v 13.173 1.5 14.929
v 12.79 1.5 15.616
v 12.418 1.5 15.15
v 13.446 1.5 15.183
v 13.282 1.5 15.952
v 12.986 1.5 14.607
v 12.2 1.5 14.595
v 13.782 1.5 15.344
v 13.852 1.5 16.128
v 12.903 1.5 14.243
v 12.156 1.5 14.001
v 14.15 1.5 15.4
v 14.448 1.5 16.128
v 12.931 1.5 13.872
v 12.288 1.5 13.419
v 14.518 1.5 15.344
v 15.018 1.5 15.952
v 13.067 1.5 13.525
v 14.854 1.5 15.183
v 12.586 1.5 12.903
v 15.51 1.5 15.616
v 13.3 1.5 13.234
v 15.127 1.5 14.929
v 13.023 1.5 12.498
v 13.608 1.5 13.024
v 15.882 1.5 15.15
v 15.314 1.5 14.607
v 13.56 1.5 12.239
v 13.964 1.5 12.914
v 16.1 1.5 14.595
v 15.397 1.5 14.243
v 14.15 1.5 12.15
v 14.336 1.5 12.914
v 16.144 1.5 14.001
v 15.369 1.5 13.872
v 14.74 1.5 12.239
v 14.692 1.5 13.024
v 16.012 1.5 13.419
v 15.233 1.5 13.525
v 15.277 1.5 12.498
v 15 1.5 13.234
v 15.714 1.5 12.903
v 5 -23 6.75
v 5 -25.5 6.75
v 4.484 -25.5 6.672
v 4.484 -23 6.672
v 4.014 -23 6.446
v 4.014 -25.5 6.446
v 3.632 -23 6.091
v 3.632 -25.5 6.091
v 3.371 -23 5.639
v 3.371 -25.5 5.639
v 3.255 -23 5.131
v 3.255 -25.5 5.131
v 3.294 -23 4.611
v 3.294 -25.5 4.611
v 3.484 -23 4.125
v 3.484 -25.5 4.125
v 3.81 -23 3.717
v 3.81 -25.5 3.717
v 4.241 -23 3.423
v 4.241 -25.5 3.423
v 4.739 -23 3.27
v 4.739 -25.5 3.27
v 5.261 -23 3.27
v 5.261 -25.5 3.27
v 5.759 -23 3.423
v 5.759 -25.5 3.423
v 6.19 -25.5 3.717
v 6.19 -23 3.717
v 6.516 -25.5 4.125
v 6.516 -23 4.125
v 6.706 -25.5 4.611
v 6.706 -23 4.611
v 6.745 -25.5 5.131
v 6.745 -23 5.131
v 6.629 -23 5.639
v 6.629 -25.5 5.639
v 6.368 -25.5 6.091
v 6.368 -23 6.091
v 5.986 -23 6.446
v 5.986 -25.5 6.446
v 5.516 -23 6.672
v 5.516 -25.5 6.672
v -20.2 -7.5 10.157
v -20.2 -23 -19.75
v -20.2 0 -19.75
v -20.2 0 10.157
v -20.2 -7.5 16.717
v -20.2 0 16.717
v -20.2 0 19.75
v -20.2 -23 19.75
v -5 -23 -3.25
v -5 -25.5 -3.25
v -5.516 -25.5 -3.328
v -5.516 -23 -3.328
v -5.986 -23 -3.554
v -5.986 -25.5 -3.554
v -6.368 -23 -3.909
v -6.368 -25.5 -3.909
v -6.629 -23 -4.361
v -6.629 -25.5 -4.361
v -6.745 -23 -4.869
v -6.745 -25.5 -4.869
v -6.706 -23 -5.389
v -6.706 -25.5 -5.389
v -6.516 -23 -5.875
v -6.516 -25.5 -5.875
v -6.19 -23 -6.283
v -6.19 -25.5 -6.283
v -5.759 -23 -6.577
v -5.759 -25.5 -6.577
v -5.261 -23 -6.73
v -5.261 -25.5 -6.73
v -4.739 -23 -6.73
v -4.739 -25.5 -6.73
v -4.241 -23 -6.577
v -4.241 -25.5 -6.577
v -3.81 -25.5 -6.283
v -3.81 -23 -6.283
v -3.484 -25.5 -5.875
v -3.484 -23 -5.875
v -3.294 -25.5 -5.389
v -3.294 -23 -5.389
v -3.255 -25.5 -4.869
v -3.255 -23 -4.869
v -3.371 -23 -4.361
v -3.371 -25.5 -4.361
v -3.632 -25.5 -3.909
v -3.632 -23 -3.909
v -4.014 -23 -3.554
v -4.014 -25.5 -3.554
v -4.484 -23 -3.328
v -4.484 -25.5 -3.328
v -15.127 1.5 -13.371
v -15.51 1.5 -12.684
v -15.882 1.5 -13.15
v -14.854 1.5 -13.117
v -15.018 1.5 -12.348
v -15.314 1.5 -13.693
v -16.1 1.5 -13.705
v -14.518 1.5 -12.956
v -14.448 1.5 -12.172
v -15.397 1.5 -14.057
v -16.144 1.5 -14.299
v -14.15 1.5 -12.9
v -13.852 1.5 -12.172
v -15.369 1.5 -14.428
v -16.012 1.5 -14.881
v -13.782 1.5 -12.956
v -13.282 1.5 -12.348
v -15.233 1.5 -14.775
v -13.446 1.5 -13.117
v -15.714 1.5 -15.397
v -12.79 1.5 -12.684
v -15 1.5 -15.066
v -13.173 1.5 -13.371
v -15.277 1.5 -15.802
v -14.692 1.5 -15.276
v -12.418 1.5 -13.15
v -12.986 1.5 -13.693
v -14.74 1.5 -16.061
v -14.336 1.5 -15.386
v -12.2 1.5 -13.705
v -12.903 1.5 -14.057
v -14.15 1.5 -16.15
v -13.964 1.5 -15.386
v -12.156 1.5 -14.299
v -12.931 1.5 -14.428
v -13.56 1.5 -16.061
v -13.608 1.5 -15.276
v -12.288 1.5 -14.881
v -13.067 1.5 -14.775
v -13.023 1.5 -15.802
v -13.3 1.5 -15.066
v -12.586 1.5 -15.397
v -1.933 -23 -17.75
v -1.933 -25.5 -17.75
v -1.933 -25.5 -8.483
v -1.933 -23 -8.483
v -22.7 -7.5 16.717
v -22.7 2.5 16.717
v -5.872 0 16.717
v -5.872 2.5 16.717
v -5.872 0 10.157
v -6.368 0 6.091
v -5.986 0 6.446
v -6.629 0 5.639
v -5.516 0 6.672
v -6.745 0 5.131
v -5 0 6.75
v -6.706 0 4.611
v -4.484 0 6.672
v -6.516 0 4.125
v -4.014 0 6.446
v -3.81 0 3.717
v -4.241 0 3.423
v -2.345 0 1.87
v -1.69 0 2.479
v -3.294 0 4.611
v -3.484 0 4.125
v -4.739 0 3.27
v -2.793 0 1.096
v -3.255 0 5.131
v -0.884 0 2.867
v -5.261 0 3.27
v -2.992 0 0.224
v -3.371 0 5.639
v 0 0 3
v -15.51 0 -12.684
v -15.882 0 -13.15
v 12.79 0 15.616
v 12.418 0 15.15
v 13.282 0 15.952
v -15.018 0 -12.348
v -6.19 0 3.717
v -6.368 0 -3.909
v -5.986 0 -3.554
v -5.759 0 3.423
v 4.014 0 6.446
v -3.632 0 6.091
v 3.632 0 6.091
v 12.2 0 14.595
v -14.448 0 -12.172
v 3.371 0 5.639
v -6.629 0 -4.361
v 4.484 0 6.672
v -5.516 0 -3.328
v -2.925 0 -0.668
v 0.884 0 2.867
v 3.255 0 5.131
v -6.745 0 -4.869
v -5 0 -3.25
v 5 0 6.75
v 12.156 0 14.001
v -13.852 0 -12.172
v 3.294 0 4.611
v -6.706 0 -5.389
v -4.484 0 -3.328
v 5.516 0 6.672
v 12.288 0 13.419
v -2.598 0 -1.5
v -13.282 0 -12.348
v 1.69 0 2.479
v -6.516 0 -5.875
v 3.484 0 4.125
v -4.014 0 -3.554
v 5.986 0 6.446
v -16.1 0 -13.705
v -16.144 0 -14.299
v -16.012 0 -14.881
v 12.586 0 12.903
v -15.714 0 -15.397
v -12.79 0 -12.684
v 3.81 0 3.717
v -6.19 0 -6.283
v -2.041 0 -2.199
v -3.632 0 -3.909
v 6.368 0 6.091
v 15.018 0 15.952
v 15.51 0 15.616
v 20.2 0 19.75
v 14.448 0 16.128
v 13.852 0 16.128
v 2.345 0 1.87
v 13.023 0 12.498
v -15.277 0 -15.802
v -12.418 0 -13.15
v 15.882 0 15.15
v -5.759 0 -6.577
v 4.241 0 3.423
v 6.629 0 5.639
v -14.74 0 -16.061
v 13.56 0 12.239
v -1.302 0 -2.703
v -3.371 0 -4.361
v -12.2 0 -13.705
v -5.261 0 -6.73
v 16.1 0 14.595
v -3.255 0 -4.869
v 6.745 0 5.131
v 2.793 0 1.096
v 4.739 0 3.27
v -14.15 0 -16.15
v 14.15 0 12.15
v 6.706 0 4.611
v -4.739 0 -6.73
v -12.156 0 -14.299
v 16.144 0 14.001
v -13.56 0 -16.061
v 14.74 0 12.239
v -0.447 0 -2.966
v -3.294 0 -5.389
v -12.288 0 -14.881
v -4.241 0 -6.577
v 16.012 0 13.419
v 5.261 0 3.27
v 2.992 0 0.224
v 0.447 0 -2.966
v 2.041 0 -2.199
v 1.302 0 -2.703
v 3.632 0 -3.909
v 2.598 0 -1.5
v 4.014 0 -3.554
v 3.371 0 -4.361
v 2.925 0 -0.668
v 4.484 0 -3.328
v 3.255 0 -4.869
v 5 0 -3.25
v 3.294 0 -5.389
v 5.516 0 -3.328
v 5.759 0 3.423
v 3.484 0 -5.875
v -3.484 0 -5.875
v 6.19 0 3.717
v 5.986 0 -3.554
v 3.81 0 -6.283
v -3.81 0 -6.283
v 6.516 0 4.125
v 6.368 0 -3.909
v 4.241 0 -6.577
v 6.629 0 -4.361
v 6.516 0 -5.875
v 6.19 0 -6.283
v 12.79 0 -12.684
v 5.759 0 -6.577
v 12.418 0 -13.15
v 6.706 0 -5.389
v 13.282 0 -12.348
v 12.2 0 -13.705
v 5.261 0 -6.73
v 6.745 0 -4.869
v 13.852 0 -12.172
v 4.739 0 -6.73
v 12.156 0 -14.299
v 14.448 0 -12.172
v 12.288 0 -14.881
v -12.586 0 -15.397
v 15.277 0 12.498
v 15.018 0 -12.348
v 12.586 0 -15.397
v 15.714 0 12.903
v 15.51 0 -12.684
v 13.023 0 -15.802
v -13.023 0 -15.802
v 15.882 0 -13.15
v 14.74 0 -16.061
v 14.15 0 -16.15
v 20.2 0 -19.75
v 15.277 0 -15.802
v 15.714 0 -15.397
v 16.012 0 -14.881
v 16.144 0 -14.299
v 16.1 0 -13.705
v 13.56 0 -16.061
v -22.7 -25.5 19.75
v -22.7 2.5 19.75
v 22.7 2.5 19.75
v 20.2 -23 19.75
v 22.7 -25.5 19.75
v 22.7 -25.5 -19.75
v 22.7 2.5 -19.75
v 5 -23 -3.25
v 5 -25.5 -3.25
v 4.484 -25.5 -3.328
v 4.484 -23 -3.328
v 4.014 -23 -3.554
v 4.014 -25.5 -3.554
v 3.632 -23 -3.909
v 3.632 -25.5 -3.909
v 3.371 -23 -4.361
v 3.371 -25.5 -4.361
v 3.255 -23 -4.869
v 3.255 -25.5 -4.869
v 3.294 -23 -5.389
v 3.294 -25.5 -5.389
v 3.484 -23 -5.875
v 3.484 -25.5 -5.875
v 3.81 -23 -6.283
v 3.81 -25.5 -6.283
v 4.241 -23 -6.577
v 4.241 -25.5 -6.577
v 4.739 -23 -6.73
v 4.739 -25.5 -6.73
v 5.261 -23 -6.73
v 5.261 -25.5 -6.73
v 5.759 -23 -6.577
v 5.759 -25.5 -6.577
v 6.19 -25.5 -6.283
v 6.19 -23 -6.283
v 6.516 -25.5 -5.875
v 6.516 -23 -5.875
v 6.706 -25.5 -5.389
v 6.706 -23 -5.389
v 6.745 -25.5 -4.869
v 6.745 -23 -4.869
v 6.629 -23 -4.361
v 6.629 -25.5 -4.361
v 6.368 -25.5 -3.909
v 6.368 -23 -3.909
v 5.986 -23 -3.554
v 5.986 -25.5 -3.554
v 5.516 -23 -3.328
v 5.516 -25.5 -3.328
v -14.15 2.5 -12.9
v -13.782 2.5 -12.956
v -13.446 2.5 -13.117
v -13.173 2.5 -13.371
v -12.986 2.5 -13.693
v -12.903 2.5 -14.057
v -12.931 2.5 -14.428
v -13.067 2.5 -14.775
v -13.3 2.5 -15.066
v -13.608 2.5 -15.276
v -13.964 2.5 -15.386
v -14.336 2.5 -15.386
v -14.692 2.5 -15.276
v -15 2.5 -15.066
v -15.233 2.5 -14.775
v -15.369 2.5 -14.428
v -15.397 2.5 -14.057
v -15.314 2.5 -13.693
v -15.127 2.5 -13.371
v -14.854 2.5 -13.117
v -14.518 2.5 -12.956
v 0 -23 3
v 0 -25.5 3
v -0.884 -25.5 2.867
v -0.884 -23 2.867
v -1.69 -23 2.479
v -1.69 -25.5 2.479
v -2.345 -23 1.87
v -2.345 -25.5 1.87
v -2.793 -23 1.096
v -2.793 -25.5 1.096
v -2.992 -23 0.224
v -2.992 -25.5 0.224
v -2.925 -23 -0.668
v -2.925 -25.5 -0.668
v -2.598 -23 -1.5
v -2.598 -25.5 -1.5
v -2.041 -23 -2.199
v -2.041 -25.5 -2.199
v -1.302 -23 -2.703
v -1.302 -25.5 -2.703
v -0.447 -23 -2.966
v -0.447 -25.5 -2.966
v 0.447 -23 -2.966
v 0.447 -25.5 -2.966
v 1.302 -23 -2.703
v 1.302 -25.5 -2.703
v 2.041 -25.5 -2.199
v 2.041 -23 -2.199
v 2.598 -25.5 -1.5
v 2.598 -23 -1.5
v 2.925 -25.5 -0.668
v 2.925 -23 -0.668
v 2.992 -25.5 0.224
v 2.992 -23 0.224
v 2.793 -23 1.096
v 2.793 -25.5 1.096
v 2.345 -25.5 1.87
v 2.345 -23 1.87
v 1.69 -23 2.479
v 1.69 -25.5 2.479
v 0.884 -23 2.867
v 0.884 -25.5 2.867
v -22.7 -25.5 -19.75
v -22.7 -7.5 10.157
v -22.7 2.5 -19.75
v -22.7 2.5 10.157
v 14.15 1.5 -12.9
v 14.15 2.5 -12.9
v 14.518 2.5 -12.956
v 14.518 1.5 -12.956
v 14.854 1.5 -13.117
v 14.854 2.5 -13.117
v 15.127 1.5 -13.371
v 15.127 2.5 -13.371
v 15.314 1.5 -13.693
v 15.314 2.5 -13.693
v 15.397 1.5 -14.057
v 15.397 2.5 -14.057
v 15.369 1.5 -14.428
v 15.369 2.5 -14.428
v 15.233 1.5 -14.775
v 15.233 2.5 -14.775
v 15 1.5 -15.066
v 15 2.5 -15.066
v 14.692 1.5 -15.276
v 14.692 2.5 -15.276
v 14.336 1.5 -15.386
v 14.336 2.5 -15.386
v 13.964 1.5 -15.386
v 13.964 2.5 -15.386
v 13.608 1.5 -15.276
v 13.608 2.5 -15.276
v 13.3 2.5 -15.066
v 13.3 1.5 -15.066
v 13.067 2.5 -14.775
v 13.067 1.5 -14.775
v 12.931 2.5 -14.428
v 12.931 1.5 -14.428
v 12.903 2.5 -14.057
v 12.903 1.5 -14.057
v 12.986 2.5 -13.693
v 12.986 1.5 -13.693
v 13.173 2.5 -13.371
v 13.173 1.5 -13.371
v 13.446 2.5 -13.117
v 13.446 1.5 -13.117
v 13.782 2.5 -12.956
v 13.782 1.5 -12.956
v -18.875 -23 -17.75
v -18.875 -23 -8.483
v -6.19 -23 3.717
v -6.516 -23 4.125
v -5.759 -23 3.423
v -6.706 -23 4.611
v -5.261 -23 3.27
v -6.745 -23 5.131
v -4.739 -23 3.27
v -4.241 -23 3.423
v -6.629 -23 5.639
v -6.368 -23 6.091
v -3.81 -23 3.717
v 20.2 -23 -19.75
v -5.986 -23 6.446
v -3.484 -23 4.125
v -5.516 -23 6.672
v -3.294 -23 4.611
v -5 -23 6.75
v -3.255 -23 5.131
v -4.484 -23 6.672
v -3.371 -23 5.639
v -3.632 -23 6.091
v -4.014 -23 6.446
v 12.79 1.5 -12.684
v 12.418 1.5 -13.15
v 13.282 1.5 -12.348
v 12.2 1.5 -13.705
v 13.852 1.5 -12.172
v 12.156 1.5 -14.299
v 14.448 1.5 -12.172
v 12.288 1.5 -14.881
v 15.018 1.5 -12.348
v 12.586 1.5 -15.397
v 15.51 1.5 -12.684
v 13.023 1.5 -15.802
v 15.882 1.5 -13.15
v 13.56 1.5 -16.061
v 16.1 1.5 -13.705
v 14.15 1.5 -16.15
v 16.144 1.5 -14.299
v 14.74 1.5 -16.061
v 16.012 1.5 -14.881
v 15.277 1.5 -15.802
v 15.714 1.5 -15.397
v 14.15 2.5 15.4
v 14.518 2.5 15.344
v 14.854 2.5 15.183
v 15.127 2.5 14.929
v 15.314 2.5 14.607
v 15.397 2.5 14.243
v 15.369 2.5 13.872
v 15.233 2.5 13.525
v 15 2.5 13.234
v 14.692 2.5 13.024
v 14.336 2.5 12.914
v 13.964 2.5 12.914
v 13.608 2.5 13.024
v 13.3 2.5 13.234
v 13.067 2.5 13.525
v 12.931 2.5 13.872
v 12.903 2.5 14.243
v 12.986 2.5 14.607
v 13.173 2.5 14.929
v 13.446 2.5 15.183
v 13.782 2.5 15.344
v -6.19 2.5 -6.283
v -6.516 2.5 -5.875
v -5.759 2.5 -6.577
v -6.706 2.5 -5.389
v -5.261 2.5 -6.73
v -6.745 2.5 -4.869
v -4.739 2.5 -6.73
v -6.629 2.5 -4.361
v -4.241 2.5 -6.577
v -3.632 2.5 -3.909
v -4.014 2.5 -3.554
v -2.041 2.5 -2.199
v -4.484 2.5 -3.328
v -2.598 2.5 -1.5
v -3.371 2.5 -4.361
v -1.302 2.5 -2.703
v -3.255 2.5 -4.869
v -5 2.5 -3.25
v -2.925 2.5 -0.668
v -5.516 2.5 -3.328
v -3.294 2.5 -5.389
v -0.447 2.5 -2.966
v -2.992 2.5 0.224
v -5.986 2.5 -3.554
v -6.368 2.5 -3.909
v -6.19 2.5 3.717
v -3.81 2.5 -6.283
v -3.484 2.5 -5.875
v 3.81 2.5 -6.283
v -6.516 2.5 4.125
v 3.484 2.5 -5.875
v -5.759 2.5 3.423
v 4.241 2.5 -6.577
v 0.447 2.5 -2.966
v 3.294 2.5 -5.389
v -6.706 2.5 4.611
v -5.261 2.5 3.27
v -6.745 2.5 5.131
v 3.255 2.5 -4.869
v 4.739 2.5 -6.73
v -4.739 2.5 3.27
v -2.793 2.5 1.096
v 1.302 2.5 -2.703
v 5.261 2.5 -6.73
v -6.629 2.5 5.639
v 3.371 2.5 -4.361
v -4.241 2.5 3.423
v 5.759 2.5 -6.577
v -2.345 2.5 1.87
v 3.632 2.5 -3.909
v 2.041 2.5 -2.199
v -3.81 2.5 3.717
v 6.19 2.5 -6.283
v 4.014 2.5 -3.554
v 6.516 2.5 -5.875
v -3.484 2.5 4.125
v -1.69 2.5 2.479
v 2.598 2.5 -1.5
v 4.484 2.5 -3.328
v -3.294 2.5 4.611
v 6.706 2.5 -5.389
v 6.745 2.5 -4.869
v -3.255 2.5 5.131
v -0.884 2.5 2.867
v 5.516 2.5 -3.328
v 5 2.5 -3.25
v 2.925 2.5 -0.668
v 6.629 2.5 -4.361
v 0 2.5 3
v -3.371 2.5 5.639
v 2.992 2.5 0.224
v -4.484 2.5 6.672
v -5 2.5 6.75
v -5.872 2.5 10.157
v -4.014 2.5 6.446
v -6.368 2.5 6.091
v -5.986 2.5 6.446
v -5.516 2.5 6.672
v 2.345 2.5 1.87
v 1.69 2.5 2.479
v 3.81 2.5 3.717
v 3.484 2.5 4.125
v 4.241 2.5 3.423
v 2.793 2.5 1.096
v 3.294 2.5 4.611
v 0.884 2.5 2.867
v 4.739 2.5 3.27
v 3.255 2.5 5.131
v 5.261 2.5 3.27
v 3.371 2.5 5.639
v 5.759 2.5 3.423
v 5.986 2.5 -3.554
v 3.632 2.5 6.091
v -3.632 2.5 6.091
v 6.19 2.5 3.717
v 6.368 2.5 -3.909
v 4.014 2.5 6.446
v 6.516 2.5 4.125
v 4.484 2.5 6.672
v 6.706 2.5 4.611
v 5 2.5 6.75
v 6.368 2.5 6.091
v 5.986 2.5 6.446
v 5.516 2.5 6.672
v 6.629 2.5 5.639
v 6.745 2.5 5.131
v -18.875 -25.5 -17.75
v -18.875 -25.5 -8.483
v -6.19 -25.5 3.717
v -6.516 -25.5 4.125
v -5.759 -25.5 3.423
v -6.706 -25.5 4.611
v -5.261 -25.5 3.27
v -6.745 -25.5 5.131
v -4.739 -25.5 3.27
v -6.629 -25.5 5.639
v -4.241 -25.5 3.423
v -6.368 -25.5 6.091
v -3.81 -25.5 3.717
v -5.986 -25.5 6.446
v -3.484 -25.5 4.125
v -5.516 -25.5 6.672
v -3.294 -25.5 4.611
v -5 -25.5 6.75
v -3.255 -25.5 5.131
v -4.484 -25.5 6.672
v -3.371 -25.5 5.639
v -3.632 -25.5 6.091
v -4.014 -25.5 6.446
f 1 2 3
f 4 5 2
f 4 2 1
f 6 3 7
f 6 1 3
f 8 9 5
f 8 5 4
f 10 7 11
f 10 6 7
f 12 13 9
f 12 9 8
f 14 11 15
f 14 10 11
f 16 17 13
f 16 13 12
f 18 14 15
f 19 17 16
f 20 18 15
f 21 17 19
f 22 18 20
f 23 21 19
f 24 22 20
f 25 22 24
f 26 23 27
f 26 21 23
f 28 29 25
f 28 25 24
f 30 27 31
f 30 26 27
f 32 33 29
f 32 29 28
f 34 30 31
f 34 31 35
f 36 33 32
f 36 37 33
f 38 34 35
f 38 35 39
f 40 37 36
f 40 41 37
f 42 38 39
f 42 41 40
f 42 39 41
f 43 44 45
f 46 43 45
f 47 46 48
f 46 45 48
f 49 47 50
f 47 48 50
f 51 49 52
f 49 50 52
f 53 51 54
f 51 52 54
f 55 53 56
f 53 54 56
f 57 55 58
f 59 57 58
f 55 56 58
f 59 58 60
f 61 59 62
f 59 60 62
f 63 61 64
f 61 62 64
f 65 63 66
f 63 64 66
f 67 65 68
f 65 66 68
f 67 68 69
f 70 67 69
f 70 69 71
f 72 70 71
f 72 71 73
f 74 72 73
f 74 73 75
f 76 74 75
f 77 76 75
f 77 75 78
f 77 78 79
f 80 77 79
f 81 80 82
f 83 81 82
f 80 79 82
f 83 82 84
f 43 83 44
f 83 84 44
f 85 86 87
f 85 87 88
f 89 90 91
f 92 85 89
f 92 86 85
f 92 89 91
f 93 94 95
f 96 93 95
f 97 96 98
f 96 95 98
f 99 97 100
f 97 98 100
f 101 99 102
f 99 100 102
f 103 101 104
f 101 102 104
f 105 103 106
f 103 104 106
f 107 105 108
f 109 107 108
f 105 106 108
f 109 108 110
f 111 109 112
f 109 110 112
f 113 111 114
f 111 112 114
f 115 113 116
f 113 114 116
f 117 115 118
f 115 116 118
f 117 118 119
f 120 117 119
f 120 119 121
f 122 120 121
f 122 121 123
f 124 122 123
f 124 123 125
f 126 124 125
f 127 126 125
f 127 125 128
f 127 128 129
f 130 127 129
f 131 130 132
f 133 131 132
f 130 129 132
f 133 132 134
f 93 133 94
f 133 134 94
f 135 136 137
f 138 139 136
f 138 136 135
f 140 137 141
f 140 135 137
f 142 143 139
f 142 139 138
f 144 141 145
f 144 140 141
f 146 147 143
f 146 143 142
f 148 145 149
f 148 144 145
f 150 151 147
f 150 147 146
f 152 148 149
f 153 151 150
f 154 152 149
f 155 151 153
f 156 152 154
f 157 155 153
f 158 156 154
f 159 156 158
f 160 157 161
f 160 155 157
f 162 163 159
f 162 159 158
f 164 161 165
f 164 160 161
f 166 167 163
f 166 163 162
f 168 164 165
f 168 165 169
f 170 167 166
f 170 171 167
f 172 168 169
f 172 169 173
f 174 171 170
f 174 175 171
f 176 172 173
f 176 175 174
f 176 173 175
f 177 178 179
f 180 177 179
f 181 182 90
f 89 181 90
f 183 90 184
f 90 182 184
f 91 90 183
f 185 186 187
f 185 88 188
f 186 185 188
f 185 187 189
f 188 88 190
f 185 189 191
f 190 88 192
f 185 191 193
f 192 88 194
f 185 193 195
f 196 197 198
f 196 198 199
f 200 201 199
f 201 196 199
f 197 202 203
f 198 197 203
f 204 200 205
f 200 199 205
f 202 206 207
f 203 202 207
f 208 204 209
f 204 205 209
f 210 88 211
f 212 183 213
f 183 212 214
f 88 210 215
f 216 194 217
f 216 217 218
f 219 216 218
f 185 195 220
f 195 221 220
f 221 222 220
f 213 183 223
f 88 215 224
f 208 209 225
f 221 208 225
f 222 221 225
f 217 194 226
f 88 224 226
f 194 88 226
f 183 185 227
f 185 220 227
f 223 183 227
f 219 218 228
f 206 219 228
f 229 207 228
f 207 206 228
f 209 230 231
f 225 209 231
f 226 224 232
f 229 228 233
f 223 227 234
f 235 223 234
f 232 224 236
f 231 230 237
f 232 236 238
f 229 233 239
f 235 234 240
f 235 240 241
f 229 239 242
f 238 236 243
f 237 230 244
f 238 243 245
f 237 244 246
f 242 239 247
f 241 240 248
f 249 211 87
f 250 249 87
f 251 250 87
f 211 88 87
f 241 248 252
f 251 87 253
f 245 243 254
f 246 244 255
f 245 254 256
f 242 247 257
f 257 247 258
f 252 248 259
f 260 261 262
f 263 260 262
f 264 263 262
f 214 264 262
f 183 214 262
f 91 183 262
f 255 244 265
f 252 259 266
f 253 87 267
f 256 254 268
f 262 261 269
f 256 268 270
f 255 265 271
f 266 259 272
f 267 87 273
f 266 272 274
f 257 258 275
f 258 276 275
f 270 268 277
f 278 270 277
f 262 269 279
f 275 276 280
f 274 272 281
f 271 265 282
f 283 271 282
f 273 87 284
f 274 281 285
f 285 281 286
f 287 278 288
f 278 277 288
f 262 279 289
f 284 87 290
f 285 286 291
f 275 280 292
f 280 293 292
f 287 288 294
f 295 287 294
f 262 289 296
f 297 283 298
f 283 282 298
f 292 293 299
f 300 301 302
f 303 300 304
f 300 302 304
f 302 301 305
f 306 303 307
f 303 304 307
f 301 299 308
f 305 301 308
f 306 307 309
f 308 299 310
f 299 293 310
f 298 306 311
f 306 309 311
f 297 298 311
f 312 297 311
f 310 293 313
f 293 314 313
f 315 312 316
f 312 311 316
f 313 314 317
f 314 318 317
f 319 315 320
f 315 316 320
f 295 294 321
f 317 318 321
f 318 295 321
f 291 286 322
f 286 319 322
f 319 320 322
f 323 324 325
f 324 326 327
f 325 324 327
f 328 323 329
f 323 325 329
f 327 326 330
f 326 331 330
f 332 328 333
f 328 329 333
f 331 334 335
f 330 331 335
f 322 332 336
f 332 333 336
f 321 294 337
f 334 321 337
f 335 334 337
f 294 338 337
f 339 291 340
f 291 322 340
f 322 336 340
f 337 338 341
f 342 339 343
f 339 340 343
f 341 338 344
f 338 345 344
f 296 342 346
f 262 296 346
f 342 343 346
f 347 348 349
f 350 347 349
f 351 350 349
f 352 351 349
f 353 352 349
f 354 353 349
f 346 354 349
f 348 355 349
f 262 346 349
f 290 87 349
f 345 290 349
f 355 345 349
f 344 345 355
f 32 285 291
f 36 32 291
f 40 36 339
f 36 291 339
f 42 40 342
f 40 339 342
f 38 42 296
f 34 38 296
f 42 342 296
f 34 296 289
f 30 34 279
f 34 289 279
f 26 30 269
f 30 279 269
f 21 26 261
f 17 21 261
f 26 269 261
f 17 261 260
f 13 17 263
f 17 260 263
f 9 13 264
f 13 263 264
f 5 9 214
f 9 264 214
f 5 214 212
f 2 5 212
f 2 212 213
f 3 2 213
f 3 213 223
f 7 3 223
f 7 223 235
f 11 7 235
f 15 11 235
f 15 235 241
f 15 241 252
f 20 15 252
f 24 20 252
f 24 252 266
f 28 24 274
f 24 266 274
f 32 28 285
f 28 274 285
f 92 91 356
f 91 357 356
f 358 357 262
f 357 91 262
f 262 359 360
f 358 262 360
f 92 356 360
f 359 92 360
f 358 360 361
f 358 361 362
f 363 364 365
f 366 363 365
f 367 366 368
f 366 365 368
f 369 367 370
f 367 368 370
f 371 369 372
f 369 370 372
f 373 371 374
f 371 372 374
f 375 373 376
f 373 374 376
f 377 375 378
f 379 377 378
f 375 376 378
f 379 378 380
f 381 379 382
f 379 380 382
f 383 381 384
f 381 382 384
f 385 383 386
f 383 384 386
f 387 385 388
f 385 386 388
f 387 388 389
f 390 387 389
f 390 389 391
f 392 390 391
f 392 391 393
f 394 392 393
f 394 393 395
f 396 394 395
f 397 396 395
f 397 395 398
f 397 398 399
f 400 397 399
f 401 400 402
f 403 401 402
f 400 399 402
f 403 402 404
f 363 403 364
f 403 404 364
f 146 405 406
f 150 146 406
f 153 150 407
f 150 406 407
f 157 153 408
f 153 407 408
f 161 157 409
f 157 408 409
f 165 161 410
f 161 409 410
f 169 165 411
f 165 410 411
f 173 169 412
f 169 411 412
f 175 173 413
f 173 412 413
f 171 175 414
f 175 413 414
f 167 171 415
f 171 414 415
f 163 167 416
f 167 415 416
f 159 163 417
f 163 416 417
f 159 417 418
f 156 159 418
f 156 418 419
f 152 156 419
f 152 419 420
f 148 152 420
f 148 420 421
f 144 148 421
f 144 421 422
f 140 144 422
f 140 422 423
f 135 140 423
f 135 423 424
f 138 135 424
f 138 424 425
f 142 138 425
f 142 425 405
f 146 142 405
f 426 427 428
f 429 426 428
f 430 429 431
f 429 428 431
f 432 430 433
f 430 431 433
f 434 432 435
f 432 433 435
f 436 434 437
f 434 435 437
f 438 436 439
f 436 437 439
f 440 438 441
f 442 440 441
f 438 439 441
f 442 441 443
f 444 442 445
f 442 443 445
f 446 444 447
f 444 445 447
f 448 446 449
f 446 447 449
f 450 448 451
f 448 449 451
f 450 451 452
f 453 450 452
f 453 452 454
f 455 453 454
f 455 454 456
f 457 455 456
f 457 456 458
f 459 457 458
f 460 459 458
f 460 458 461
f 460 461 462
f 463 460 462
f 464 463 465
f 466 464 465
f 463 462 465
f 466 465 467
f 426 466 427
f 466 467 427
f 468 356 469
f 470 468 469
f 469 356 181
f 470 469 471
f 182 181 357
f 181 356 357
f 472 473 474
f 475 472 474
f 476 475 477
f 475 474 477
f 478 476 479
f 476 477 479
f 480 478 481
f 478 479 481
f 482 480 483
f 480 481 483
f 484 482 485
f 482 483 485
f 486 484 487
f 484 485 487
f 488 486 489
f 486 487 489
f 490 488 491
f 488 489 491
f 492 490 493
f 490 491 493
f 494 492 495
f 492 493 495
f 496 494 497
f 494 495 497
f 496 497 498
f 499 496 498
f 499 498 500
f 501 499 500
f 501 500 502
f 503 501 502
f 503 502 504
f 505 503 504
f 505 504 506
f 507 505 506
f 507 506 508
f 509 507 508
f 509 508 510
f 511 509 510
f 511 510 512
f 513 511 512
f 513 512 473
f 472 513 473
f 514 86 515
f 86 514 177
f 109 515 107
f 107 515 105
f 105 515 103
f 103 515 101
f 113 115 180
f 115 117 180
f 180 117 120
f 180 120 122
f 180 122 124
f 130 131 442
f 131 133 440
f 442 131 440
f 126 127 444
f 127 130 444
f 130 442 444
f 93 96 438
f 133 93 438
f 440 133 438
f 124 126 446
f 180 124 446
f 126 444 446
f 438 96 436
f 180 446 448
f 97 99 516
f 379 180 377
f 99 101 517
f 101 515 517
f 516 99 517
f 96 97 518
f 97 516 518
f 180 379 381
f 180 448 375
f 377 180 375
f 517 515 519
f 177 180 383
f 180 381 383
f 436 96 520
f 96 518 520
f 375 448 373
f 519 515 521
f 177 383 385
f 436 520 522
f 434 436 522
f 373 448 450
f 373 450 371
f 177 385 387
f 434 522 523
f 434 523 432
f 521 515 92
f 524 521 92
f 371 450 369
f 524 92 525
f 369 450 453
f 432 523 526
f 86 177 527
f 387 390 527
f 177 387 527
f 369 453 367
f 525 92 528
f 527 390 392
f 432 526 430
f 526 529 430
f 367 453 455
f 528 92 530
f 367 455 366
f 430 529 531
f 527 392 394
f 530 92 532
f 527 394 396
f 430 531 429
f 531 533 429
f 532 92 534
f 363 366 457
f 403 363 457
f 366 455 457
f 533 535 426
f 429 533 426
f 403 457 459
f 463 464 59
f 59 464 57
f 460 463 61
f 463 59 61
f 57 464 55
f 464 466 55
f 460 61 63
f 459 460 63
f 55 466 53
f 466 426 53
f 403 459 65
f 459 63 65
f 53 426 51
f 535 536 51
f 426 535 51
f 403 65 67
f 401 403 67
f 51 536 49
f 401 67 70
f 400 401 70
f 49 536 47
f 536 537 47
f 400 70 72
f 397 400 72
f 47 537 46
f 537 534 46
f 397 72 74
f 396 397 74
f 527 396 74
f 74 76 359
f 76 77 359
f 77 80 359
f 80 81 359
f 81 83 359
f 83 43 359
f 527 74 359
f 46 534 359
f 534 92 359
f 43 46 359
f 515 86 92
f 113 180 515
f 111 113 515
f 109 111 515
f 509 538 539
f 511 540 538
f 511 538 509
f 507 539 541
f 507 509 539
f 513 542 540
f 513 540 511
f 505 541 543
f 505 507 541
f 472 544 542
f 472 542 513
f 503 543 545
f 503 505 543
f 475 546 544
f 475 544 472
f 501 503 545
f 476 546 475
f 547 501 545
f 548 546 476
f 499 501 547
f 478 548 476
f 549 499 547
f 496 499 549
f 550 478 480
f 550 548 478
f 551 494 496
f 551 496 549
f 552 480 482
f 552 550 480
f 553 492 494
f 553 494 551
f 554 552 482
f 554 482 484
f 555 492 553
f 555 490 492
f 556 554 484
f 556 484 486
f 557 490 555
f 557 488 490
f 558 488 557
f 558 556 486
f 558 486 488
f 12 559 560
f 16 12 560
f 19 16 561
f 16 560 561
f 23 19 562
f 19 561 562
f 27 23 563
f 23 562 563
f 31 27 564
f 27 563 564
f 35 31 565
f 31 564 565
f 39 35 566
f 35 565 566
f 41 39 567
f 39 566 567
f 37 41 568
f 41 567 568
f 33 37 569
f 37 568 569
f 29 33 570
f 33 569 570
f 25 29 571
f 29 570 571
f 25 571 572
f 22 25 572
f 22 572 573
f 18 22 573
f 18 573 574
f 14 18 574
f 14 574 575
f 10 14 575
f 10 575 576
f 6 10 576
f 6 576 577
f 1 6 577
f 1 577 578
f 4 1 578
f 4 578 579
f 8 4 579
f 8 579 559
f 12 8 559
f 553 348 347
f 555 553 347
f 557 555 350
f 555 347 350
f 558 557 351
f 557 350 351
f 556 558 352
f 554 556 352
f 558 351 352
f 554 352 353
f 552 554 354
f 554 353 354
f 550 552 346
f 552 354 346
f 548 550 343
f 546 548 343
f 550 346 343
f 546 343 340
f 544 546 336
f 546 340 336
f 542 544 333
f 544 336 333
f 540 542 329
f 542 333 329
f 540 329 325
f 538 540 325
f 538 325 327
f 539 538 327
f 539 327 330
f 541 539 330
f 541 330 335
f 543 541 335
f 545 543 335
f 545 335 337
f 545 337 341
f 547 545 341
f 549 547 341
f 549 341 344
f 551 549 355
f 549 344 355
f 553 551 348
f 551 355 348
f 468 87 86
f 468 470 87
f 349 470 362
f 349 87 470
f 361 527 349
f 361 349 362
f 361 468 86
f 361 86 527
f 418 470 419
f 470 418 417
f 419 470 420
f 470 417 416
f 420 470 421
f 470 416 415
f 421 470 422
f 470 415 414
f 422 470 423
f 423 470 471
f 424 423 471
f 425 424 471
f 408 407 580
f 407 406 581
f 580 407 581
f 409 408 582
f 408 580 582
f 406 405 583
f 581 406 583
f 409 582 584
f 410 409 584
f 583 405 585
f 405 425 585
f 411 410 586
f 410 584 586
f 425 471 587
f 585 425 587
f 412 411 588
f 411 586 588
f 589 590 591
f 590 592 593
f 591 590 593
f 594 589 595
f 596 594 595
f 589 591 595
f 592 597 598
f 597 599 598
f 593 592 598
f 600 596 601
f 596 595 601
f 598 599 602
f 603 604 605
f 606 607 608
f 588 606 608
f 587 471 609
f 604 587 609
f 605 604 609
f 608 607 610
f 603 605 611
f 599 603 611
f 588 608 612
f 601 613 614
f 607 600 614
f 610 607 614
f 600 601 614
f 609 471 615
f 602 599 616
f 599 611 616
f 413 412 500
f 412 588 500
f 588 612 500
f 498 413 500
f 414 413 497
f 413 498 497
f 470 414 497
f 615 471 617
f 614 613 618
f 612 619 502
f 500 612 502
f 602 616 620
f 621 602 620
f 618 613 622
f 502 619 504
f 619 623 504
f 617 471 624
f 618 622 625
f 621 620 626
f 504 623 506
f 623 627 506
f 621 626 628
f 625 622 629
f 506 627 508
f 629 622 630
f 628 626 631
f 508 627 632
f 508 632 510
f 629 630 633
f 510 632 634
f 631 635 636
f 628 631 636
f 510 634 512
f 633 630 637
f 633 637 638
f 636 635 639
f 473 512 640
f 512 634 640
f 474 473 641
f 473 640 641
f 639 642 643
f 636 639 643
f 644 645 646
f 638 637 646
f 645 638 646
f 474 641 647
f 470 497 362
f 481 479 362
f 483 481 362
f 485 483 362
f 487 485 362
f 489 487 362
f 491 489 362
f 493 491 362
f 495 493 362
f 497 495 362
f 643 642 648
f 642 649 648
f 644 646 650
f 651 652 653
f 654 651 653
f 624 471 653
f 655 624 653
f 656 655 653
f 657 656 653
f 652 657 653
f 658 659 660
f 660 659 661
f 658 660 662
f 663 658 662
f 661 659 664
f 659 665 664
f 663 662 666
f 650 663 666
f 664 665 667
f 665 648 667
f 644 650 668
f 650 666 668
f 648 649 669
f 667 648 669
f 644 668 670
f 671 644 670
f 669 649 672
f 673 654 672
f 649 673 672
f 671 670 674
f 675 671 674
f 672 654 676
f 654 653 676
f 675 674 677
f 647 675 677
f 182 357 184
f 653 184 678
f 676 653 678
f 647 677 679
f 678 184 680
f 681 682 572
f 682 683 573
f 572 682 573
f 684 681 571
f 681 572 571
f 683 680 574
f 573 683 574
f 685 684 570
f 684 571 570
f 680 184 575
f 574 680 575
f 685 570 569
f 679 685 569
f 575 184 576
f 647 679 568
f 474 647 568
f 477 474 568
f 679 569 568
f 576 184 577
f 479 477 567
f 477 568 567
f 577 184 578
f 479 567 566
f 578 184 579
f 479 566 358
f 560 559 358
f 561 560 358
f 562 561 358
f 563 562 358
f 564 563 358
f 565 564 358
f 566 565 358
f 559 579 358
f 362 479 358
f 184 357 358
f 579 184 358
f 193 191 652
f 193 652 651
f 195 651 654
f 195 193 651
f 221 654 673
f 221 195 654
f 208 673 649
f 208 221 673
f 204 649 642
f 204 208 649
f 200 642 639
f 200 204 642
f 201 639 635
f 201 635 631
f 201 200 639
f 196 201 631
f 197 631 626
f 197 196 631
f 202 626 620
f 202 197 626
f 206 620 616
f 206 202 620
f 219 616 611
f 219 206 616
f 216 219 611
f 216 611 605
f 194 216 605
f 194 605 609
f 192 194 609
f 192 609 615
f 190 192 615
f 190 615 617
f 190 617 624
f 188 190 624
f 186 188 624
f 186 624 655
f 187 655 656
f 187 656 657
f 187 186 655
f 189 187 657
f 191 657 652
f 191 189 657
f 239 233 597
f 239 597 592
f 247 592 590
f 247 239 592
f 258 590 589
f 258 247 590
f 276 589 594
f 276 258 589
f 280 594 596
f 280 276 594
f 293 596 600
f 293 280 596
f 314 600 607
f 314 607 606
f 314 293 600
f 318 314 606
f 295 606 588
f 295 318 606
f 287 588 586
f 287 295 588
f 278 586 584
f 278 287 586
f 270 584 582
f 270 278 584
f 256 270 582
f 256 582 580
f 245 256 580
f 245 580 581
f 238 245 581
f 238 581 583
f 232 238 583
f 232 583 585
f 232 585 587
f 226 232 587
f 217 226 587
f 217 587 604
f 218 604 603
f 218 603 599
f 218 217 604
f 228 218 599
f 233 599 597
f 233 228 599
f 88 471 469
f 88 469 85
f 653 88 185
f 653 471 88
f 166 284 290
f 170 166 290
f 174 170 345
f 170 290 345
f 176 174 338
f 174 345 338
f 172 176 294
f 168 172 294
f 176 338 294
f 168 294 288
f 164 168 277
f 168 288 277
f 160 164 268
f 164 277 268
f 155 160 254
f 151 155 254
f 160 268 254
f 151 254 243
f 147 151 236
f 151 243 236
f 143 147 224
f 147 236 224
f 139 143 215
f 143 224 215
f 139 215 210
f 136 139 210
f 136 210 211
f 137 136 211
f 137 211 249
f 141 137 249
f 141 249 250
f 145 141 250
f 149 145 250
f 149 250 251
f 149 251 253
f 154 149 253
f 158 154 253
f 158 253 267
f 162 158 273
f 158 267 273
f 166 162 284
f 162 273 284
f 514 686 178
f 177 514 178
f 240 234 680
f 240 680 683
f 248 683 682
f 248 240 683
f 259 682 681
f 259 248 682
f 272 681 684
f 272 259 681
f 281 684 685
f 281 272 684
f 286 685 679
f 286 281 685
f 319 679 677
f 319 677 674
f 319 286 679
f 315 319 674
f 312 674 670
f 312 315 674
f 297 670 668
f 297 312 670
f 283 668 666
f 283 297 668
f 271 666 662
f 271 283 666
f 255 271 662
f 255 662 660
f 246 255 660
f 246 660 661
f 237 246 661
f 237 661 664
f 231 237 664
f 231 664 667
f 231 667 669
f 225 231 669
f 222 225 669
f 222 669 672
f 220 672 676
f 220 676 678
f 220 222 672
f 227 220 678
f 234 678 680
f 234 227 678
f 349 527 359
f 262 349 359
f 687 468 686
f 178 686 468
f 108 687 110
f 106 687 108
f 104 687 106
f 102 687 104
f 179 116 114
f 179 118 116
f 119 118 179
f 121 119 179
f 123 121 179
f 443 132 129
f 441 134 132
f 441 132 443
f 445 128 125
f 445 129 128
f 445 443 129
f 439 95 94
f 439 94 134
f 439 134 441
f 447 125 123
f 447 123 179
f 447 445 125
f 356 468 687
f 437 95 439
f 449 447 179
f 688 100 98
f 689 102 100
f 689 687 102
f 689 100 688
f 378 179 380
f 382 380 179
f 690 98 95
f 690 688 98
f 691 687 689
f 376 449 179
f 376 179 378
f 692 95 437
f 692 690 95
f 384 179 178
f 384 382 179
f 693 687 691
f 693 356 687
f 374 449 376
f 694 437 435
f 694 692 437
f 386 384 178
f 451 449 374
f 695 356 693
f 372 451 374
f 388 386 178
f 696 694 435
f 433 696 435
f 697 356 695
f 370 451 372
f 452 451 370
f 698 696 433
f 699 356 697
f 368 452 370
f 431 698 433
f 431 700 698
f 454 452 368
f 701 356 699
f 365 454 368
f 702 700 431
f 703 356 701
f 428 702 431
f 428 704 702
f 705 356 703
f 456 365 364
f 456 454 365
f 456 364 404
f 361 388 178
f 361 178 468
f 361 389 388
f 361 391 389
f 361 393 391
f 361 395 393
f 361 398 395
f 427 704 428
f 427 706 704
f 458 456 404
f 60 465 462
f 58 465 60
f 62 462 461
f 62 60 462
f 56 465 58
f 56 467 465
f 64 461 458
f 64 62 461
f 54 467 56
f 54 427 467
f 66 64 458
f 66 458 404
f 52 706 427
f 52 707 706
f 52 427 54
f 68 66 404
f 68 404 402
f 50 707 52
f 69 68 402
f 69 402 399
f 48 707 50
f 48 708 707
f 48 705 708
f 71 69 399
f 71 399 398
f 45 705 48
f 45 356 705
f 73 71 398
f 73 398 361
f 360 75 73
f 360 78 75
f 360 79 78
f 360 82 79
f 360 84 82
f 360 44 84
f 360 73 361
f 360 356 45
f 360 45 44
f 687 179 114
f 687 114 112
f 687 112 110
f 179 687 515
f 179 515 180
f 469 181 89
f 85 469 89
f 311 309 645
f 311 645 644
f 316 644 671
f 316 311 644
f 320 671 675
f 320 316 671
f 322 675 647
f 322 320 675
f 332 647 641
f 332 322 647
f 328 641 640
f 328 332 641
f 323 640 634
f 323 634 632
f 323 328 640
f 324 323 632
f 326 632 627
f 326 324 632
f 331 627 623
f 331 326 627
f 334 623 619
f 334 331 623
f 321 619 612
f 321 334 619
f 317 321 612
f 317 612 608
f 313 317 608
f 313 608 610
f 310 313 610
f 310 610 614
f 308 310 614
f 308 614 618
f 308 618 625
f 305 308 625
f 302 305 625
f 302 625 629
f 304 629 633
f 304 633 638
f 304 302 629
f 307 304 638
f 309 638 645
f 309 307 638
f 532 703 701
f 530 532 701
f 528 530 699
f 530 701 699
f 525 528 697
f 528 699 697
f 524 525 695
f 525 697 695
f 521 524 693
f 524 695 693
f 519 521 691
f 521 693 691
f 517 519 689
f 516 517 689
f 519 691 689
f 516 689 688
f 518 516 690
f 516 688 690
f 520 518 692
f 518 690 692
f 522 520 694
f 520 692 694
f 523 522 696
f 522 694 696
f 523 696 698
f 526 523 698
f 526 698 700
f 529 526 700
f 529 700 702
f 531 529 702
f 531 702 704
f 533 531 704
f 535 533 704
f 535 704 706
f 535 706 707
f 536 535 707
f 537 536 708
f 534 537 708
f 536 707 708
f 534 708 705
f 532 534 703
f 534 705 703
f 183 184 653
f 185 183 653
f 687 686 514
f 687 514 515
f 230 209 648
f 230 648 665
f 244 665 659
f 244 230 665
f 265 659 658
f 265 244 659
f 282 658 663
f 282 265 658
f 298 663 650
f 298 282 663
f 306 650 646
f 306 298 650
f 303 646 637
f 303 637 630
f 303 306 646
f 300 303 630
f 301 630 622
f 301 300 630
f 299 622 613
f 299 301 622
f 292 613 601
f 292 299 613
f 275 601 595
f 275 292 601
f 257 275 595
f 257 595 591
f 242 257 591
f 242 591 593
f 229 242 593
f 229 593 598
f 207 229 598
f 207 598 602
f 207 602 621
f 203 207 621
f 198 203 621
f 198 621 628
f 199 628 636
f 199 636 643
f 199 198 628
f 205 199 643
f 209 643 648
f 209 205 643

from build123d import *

# Parameters (mm, degrees)
SKETCH_1_W           = 50
SKETCH_1_H           = 39.5
SKETCH_1_R           = 1.51
SKETCH_1_R_2         = 1.75
SKETCH_1_R_3         = 3
EXTRUDE_1_DEPTH      = 2.5
SKETCH_2_W           = 2
SKETCH_2_H           = 39.5
EXTRUDE_6_DEPTH      = 28
SKETCH_3_W           = 50
SKETCH_3_H           = 39.5
SKETCH_3_R           = 1.75
SKETCH_3_R_2         = 3
SKETCH_3_R_3         = 1.51
EXTRUDE_7_DEPTH      = 2.5
SKETCH_4_W           = 16.941744986
SKETCH_4_H           = 9.266793399
CUT_EXTRUDE_1_DEPTH  = 10
SKETCH_5_W           = 6.8
SKETCH_5_H           = 39.5
EXTRUDE_8_DEPTH      = 29
SKETCH_6_OUTSIDE_W   = 70.584
SKETCH_6_OUTSIDE_H   = 45.584
SKETCH_6_OUTSIDE_W_2 = 45.4
SKETCH_6_OUTSIDE_H_2 = 28
CUT_EXTRUDE_2_DEPTH  = 55.217155956
SKETCH_7_R           = 1.25
CUT_EXTRUDE_3_DEPTH  = 10
SKETCH_8_R           = 2
CUT_EXTRUDE_4_DEPTH  = 1.5
SKETCH_9_W           = 16.827913255
SKETCH_9_H           = 6.559808616
CUT_EXTRUDE_5_DEPTH  = 10


with BuildPart() as part:
    # 草图1 → 凸台-拉伸1 (new body)
    with BuildSketch(Plane(origin=(0, 0, 0), x_dir=(1, 0, 0), z_dir=(0, 1, 0))):
        Rectangle(SKETCH_1_W, SKETCH_1_H)
        with Locations(Location((22.5, 9.75, 0), (0, 0, 270))):
            Circle(SKETCH_1_R, mode=Mode.SUBTRACT)
        with Locations(Location((-22.5, 9.75, 0), (0, 0, 270))):
            Circle(SKETCH_1_R, mode=Mode.SUBTRACT)
        with Locations(Location((-5, -5, 0), (0, 0, 270))):
            Circle(SKETCH_1_R_2, mode=Mode.SUBTRACT)
        with Locations(Location((5, -5, 0), (0, 0, 270))):
            Circle(SKETCH_1_R_2, mode=Mode.SUBTRACT)
        with Locations(Location((5, 5, 0), (0, 0, 270))):
            Circle(SKETCH_1_R_2, mode=Mode.SUBTRACT)
        with Locations(Location((-5, 5, 0), (0, 0, 270))):
            Circle(SKETCH_1_R_2, mode=Mode.SUBTRACT)
        with Locations(Location((0, 0, 0), (0, 0, 270))):
            Circle(SKETCH_1_R_3, mode=Mode.SUBTRACT)
        with Locations(Location((22.5, -9.75, 0), (0, 0, 270))):
            Circle(SKETCH_1_R, mode=Mode.SUBTRACT)
        with Locations(Location((-22.5, -9.75, 0), (0, 0, 270))):
            Circle(SKETCH_1_R, mode=Mode.SUBTRACT)
    extrude(amount=EXTRUDE_1_DEPTH)

    # 草图2 → 凸台-拉伸6 (add)
    with BuildSketch(Plane(origin=(0, 2.5, 0), x_dir=(1, 0, 0), z_dir=(0, 1, 0))):
        with Locations((-26, 0)):
            Rectangle(SKETCH_2_W, SKETCH_2_H)
        with Locations((26, 0)):
            Rectangle(SKETCH_2_W, SKETCH_2_H)
    extrude(amount=-EXTRUDE_6_DEPTH)

    # 草图3 → 凸台-拉伸7 (add)
    with BuildSketch(Plane.XZ.offset(25.5)):
        Rectangle(SKETCH_3_W, SKETCH_3_H)
        with Locations(Location((-5, 5, 0), (0, 0, 90))):
            Circle(SKETCH_3_R, mode=Mode.SUBTRACT)
        with Locations(Location((5, 5, 0), (0, 0, 90))):
            Circle(SKETCH_3_R, mode=Mode.SUBTRACT)
        with Locations(Location((5, -5, 0), (0, 0, 90))):
            Circle(SKETCH_3_R, mode=Mode.SUBTRACT)
        with Locations(Location((-5, -5, 0), (0, 0, 90))):
            Circle(SKETCH_3_R, mode=Mode.SUBTRACT)
        with Locations(Location((0, 0, 0), (0, 0, 90))):
            Circle(SKETCH_3_R_2, mode=Mode.SUBTRACT)
        with Locations(Location((22.5, -9.75, 0), (0, 0, 90))):
            Circle(SKETCH_3_R_3, mode=Mode.SUBTRACT)
        with Locations(Location((-22.5, -9.75, 0), (0, 0, 90))):
            Circle(SKETCH_3_R_3, mode=Mode.SUBTRACT)
        with Locations(Location((-22.5, 9.75, 0), (0, 0, 90))):
            Circle(SKETCH_3_R_3, mode=Mode.SUBTRACT)
        with Locations(Location((22.5, 9.75, 0), (0, 0, 90))):
            Circle(SKETCH_3_R_3, mode=Mode.SUBTRACT)
    extrude(amount=-EXTRUDE_7_DEPTH)

    # 草图4 → 切除-拉伸1 (cut)
    with BuildSketch(Plane.XZ.offset(25.5)):
        with Locations((-10.403823263, -13.116741256)):
            Rectangle(SKETCH_4_W, SKETCH_4_H)
    extrude(amount=-CUT_EXTRUDE_1_DEPTH, mode=Mode.SUBTRACT)

    # 草图5 → 凸台-拉伸8 (add)
    with BuildSketch(Plane.XZ.offset(25.5)):
        with Locations((23.6, 0)):
            Rectangle(SKETCH_5_W, SKETCH_5_H)
        with Locations((-23.6, 0)):
            Rectangle(SKETCH_5_W, SKETCH_5_H)
    extrude(amount=-EXTRUDE_8_DEPTH)

    # 草图6 outside → 切除-拉伸2 (cut, through all)
    with BuildSketch(Plane.XY.offset(19.75)):
        with Locations((0, -11)):
            Rectangle(SKETCH_6_OUTSIDE_W, SKETCH_6_OUTSIDE_H)
        with Locations((0, -11.5)):
            Rectangle(SKETCH_6_OUTSIDE_W_2, SKETCH_6_OUTSIDE_H_2, mode=Mode.SUBTRACT)
    extrude(amount=-CUT_EXTRUDE_2_DEPTH, mode=Mode.SUBTRACT)

    # 草图7 → 切除-拉伸3 (cut)
    with BuildSketch(Plane(origin=(0, 2.5, 0), x_dir=(1, 0, 0), z_dir=(0, 1, 0))):
        with Locations(Location((14.15, 14.15, 0), (0, 0, 270))):
            Circle(SKETCH_7_R)
        with Locations(Location((14.15, -14.15, 0), (0, 0, 270))):
            Circle(SKETCH_7_R)
        with Locations(Location((-14.15, -14.15, 0), (0, 0, 270))):
            Circle(SKETCH_7_R)
        with Locations(Location((-14.15, 14.15, 0), (0, 0, 270))):
            Circle(SKETCH_7_R)
    extrude(amount=-CUT_EXTRUDE_3_DEPTH, mode=Mode.SUBTRACT)

    # 草图8 → 切除-拉伸4 (cut)
    with BuildSketch(Plane.XZ):
        with Locations(Location((-14.15, -14.15, 0), (0, 0, 270))):
            Circle(SKETCH_8_R)
        with Locations(Location((-14.15, 14.15, 0), (0, 0, 270))):
            Circle(SKETCH_8_R)
        with Locations(Location((14.15, 14.15, 0), (0, 0, 270))):
            Circle(SKETCH_8_R)
        with Locations(Location((14.15, -14.15, 0), (0, 0, 270))):
            Circle(SKETCH_8_R)
    extrude(amount=-CUT_EXTRUDE_4_DEPTH, mode=Mode.SUBTRACT)

    # 草图9 → 切除-拉伸5 (cut)
    with BuildSketch(Plane(origin=(0, 2.5, 0), x_dir=(1, 0, 0), z_dir=(0, 1, 0))):
        with Locations((-14.286043373, -13.437027327)):
            Rectangle(SKETCH_9_W, SKETCH_9_H)
    extrude(amount=-CUT_EXTRUDE_5_DEPTH, mode=Mode.SUBTRACT)


solid = part.part
